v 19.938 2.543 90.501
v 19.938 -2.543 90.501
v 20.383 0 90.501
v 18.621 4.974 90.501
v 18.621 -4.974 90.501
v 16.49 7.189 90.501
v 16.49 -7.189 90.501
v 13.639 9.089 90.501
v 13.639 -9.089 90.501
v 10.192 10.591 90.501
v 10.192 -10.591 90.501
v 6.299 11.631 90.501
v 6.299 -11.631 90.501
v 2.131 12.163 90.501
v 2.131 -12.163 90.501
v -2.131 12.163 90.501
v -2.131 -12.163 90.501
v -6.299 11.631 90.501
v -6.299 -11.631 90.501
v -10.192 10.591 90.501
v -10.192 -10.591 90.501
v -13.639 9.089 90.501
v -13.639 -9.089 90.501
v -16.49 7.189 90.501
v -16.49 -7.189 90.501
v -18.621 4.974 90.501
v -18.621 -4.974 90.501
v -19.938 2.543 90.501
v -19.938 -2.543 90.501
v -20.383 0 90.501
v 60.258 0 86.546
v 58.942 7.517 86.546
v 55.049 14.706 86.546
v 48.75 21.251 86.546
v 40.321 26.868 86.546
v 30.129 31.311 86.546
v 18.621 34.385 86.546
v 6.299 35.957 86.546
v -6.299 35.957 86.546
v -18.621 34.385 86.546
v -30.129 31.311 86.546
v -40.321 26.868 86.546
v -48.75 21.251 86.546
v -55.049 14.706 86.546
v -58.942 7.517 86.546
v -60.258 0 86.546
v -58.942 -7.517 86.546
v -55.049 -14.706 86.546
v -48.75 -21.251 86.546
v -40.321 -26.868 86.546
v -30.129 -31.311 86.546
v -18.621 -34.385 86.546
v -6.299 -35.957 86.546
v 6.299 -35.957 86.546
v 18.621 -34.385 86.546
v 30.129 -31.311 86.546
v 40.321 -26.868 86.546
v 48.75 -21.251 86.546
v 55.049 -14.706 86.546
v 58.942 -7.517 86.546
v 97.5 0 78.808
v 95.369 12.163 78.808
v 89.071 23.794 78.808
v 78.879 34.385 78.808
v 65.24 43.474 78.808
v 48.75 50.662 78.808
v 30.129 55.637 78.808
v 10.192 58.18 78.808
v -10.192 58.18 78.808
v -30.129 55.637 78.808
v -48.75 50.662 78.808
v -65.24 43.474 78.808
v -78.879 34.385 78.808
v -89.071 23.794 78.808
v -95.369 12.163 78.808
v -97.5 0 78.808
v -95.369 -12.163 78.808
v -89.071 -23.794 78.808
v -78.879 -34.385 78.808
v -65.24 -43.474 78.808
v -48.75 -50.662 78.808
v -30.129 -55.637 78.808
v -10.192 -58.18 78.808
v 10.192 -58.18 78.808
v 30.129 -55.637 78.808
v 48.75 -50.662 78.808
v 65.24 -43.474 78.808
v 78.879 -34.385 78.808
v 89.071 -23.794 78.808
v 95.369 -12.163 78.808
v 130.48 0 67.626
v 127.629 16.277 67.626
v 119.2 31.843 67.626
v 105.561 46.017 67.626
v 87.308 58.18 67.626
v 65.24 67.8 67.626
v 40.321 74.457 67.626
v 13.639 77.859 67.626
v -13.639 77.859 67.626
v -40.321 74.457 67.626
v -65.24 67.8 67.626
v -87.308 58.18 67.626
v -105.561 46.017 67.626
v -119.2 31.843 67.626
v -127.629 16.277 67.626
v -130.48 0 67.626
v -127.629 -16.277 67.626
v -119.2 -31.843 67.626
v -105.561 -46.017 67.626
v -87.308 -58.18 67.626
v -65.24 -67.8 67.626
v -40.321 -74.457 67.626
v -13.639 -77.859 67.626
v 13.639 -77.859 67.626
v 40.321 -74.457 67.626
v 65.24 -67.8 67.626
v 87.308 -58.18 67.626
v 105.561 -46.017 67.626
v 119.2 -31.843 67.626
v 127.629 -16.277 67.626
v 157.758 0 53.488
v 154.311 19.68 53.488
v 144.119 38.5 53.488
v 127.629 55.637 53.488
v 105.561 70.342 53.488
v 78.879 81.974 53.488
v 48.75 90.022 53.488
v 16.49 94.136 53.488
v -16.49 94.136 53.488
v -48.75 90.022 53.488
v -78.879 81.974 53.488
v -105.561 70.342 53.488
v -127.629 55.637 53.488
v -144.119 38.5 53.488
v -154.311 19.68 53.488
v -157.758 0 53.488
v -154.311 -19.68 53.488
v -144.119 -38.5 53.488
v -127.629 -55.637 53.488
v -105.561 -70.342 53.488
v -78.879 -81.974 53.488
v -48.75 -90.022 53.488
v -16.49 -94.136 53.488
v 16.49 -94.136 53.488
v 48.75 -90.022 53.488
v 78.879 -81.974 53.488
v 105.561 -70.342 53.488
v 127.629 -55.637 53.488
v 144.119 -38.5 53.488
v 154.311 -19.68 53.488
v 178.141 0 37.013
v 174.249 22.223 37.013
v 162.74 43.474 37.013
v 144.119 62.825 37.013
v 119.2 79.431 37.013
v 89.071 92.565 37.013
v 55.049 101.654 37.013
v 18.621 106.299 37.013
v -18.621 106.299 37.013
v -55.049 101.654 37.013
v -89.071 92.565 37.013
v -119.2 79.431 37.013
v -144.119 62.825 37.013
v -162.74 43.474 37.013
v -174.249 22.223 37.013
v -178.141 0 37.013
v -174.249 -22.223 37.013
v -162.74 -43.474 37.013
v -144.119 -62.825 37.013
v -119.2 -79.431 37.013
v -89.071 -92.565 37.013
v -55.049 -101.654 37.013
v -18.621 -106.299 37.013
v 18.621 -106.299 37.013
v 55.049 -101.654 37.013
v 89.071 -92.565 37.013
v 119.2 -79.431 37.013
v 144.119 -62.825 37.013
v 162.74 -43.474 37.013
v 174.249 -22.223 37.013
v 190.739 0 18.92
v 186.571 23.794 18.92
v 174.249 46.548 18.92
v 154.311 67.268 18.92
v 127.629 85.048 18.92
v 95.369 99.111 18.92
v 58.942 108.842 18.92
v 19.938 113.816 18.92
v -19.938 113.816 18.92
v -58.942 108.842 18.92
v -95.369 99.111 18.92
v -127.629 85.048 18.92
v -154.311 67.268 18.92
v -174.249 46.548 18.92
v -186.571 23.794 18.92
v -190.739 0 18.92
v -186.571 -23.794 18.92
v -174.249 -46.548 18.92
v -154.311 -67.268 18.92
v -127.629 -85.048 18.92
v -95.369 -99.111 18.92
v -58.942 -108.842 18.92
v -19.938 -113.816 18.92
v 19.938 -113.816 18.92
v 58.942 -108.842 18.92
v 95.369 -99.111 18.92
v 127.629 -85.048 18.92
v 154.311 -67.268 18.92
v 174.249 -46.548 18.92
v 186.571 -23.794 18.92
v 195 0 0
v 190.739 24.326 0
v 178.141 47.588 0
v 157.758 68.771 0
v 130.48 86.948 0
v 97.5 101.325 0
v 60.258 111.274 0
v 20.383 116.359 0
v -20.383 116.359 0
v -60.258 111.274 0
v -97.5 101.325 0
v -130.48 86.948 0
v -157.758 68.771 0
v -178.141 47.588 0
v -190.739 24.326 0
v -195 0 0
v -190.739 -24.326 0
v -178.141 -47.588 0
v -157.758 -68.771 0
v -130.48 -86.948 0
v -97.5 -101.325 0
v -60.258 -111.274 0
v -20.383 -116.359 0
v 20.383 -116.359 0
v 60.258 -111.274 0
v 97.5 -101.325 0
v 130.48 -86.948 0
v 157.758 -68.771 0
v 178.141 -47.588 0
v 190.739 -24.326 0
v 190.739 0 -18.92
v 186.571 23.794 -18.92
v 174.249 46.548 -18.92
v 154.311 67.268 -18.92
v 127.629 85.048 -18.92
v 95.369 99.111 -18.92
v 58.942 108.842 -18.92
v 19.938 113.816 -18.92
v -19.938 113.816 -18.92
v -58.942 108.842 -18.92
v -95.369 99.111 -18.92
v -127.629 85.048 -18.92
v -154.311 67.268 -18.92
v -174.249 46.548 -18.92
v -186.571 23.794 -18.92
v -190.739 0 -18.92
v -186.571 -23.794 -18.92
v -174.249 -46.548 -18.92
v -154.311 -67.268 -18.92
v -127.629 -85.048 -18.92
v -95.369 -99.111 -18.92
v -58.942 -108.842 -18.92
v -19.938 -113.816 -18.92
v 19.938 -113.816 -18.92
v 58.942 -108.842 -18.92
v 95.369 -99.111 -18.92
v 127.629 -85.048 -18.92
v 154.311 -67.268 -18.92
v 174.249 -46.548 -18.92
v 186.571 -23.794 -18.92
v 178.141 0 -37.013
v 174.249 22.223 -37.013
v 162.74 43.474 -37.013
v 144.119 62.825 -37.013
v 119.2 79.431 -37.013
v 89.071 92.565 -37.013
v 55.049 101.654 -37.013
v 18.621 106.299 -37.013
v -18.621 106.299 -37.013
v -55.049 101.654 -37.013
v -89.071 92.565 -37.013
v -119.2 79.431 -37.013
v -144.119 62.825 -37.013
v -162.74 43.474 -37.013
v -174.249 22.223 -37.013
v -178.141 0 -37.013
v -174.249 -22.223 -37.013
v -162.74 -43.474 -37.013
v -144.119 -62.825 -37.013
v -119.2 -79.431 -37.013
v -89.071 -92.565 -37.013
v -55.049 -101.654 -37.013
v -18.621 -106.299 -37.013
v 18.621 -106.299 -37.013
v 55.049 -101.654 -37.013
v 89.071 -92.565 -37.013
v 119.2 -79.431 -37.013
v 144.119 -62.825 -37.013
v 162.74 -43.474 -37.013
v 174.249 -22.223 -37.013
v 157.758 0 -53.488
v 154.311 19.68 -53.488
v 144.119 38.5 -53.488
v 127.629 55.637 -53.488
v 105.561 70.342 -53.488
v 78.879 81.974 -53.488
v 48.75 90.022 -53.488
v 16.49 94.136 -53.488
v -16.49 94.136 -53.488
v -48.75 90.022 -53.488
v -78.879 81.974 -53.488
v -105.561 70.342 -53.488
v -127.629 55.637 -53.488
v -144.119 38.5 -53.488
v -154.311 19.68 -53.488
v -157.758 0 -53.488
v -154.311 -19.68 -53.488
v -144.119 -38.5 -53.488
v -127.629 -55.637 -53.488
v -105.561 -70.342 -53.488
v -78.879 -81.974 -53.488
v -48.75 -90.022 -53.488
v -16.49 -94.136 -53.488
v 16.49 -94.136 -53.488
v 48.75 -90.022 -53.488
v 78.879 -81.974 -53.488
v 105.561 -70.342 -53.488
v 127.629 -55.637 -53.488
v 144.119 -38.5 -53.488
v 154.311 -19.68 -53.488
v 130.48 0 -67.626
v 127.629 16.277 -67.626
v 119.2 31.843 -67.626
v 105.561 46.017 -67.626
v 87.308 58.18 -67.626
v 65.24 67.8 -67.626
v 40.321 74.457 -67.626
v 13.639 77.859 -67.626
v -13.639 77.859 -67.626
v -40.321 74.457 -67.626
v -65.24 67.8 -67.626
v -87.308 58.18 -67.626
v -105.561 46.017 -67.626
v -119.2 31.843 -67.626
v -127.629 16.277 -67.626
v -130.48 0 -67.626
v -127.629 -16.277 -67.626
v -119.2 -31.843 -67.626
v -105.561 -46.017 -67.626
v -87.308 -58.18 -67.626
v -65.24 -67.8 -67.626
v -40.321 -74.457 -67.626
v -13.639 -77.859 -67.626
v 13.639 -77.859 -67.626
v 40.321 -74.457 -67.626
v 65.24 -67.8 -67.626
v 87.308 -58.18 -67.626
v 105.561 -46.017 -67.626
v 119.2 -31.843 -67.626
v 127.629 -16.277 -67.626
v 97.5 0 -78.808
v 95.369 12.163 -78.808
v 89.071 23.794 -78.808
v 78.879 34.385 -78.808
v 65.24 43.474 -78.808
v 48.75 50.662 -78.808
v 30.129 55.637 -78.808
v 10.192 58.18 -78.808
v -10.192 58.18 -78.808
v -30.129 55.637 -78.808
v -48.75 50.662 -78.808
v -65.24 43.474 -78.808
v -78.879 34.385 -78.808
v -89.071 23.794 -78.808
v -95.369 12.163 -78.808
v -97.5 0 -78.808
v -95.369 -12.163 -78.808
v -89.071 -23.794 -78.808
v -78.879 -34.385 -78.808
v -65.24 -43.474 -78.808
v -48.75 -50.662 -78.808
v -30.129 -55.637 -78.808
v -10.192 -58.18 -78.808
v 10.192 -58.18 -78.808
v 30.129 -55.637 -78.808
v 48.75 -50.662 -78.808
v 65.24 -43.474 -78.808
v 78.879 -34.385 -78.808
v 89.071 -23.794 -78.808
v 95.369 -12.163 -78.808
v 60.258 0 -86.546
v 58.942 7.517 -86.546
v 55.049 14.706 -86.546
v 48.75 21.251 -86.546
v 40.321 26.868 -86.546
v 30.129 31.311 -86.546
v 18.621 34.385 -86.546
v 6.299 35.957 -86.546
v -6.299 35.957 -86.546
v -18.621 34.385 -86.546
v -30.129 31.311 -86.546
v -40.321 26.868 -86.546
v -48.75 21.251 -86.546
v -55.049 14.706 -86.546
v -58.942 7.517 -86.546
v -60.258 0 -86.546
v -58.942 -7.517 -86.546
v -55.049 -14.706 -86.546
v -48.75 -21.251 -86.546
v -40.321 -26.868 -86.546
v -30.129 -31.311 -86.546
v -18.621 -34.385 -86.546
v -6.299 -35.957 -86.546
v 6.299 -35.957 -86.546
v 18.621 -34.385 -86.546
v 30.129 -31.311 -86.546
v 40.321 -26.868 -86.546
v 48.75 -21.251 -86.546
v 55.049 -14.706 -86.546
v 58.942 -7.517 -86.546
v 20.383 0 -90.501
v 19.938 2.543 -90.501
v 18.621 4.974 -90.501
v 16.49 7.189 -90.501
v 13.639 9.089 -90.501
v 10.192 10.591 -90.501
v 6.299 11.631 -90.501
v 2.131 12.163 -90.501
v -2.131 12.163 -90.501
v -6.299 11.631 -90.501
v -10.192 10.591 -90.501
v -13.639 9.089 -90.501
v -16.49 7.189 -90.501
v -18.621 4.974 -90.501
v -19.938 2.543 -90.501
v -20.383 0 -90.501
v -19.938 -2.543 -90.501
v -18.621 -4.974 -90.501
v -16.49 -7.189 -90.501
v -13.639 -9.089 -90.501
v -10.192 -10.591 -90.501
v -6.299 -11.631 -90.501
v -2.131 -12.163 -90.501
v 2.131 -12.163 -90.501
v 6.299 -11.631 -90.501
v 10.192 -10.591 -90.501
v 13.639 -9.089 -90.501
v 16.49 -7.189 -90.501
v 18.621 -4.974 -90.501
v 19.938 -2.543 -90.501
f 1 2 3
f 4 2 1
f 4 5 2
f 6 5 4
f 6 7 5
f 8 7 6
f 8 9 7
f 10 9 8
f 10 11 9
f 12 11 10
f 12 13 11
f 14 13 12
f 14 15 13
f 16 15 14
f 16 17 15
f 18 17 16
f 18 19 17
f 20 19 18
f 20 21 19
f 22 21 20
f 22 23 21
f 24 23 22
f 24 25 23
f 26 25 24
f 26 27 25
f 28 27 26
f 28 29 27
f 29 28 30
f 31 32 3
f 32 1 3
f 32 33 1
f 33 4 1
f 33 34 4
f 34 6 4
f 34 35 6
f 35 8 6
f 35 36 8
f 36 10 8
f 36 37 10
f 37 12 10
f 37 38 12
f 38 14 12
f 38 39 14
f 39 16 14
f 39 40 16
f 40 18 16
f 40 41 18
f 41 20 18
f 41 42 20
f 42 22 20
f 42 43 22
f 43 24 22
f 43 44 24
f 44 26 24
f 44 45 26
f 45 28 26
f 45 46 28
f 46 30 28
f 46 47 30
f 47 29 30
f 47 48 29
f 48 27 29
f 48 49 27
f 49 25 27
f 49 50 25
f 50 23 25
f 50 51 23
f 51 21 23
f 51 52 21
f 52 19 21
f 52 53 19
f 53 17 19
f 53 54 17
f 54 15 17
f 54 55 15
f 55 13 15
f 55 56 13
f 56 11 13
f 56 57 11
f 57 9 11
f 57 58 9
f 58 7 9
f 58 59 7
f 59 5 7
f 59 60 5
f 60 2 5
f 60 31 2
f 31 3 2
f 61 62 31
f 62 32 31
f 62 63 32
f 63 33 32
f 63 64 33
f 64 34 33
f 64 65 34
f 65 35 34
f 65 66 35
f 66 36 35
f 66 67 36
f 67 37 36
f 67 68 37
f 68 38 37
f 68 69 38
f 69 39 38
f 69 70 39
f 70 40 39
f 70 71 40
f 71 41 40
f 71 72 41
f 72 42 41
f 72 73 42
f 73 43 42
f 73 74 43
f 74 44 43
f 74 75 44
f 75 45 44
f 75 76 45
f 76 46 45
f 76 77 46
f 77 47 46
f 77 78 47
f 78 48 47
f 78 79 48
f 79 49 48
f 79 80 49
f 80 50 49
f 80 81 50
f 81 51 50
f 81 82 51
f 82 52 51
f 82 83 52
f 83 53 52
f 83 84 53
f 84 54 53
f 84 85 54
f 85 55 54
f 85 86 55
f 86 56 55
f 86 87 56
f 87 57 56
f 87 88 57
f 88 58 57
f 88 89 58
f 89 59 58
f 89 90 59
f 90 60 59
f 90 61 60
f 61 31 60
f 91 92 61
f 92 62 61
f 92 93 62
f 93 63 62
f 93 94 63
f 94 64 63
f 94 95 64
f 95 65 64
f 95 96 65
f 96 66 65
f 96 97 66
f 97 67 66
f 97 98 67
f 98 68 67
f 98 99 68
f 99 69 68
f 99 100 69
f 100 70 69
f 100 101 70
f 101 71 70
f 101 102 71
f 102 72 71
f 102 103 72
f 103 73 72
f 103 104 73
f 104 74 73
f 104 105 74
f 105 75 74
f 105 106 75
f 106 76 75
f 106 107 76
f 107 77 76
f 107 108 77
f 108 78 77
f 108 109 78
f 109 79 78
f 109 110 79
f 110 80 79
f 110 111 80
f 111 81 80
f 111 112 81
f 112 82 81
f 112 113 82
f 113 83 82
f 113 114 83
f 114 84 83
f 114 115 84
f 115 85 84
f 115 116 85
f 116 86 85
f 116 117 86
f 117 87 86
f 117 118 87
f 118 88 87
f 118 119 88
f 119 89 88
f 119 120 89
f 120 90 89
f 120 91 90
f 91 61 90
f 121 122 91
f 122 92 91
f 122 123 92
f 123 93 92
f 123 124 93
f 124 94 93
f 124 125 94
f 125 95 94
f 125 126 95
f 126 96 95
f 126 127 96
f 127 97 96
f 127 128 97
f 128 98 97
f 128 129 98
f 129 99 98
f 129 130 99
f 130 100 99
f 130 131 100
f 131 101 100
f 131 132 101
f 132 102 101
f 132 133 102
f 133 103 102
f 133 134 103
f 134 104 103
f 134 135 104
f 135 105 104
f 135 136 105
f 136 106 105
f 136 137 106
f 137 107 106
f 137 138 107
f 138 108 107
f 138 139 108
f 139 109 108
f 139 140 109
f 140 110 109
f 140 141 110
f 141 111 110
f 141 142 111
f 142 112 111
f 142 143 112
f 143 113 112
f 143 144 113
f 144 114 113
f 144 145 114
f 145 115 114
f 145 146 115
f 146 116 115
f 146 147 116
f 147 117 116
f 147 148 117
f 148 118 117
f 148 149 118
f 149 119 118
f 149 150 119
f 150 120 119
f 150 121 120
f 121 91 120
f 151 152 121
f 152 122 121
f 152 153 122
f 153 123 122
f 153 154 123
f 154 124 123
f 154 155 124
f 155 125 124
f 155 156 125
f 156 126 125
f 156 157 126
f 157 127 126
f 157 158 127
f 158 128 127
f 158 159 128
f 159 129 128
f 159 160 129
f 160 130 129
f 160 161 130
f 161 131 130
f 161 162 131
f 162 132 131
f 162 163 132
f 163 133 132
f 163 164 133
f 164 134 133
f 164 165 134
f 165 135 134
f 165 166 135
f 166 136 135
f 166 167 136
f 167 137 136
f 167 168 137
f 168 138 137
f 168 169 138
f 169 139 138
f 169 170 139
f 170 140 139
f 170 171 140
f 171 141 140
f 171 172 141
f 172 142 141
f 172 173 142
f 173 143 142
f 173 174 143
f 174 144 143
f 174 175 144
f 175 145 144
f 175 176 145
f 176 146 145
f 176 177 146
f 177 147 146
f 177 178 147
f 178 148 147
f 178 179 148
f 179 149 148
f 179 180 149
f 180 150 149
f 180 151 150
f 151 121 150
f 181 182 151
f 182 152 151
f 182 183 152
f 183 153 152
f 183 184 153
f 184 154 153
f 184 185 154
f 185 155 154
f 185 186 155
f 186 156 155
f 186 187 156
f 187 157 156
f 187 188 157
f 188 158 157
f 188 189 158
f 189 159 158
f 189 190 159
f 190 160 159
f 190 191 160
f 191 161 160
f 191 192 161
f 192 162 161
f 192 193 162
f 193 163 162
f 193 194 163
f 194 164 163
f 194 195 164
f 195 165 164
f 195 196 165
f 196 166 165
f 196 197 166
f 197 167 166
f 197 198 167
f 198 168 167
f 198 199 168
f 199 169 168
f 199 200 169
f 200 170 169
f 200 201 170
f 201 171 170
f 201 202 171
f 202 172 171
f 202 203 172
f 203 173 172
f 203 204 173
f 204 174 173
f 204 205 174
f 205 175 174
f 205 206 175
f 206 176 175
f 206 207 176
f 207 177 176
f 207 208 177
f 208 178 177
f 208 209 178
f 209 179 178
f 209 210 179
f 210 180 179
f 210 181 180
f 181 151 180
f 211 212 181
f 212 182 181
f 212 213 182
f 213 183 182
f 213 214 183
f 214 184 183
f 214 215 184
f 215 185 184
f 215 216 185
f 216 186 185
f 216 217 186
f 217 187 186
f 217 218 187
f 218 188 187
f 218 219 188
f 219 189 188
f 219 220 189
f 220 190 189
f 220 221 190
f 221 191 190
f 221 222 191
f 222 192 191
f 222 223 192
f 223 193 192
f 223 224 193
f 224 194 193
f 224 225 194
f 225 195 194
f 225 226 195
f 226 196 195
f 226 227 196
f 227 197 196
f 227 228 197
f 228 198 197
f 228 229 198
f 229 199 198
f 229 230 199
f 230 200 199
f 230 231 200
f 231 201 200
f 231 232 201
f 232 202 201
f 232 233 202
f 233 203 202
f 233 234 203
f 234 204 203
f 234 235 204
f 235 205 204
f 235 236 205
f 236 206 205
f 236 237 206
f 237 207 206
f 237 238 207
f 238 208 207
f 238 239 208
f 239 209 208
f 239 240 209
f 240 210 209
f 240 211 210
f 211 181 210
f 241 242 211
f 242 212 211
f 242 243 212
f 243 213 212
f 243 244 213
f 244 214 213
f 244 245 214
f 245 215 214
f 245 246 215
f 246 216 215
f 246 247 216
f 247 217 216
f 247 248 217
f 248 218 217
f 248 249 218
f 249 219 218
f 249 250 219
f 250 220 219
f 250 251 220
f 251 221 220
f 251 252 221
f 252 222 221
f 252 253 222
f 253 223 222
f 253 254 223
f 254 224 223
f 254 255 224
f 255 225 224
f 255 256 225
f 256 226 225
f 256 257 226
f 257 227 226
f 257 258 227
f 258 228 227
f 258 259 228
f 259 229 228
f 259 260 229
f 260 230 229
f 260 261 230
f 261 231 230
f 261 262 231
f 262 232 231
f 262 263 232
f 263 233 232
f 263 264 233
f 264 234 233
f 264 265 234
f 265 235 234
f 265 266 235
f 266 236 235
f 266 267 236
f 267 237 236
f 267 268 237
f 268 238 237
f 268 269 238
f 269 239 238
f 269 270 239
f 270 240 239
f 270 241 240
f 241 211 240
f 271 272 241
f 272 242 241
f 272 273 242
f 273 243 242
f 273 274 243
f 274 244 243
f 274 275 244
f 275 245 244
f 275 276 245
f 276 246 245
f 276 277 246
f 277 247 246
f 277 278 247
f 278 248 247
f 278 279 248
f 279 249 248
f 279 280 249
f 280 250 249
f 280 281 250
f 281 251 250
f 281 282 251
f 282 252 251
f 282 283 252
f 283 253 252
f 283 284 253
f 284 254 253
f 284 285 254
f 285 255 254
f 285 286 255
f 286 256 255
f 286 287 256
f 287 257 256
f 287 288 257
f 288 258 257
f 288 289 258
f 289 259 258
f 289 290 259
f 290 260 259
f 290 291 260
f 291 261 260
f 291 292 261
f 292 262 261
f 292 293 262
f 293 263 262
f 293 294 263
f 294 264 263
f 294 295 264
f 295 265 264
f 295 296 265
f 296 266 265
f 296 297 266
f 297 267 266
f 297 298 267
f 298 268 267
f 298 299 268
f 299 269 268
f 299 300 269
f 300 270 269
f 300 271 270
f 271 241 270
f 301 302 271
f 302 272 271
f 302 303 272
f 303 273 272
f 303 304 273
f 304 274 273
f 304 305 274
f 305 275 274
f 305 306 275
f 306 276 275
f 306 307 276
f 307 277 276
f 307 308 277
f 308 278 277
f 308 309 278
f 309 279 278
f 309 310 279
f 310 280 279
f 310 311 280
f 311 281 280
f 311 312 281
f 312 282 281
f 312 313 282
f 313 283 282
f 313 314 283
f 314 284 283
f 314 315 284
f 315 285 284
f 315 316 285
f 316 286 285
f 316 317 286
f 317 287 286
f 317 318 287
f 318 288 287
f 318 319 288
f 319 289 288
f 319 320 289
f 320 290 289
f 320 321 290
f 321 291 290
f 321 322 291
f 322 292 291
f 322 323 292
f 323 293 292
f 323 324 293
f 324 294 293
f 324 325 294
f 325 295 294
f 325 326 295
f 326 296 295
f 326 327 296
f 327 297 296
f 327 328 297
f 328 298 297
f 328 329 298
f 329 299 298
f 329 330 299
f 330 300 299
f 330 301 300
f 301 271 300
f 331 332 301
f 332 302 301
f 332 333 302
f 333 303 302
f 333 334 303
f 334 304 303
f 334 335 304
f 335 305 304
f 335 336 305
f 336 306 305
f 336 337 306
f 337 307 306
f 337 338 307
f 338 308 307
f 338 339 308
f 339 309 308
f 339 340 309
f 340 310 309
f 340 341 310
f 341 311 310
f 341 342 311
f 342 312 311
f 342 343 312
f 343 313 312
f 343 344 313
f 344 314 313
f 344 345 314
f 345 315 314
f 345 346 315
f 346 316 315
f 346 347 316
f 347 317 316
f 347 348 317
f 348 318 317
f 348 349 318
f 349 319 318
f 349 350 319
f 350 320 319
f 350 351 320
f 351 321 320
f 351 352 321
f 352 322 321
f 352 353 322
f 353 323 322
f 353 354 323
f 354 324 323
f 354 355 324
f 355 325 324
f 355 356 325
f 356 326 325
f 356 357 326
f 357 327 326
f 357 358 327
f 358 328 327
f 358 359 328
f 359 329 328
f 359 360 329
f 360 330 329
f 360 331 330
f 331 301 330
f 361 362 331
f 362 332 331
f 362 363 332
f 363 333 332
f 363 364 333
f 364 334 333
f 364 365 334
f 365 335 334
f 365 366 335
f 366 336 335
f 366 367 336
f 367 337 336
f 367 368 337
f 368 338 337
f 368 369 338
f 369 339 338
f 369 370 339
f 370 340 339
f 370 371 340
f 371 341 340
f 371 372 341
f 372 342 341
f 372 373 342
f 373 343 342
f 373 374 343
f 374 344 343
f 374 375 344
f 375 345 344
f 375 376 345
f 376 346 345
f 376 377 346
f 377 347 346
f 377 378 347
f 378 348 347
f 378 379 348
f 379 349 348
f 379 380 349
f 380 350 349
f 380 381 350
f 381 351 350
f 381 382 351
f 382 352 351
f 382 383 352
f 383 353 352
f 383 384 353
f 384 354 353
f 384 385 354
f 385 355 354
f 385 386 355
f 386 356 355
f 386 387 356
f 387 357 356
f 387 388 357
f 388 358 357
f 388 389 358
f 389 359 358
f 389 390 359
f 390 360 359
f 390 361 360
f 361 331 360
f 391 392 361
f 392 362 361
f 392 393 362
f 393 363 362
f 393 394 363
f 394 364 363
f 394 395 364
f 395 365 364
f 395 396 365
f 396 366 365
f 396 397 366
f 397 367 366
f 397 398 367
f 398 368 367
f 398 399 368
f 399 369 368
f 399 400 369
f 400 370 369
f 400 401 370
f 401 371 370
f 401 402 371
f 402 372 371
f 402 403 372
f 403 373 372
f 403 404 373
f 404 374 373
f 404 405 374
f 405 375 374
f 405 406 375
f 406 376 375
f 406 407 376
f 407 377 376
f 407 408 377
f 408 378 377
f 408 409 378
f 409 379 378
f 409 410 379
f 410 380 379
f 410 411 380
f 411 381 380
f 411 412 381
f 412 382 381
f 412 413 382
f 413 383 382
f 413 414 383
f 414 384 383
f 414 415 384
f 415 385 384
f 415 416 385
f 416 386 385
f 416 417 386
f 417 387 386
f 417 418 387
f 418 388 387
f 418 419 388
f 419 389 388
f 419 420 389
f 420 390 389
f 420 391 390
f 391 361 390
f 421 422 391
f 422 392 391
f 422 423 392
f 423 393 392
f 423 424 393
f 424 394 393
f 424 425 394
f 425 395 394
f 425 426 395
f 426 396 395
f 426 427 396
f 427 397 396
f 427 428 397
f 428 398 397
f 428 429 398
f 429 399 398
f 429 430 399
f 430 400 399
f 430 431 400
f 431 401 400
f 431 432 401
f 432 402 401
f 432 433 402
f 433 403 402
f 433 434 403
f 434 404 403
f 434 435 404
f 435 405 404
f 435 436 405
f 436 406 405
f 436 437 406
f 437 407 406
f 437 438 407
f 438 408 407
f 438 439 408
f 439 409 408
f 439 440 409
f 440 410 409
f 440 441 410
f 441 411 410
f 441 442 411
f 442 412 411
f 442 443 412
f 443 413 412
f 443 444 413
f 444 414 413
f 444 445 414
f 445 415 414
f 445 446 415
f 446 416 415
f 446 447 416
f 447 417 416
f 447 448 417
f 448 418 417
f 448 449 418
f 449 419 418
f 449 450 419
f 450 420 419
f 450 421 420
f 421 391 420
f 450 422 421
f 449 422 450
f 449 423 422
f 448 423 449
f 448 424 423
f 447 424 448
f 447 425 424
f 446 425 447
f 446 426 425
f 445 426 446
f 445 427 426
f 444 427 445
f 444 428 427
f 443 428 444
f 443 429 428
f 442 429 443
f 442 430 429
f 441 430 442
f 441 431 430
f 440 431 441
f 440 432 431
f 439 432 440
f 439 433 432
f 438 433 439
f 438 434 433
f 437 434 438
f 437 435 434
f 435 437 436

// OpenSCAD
// Generated by SolidPython 1.0.1 on 2020-07-29 00:46:52


scale(v = [15, 9, 7]) {
	sphere(r = 13);
}
/***********************************************
*********      SolidPython code:      **********
************************************************
 
# import packages: SolidPython
from solid import *
from solid.utils import *
from itertools import chain, combinations, permutations


class Resize:

    def __init__(self, scad_file):
        self.scad_file = scad_file
        #self.scad_file = import_scad(scad_file)
        # cone/cylinder param:
        self.r1 = 0
        self.r2 = 0
        self.h = 0
        # rectangular prism param:
        self.w = 0
        self.l = 0
        # ellipse param:
        self.r = 0

    # import OpenScad code (file name corresponds to shape)


    # classify shape + parameters
    def assign(self, param1, param2, param3):
        if self.scad_file == 'cone.scad':
            self.r1 = param1
            self.r2 = param2
            self.h = param3
        elif self.scad_file == 'cylinder.scad':
            self.r1 = param1
            self.r2 = param2
            self.h = param3
        elif self.scad_file == 'rectangularPrism.scad':
            self.h = param1
            self.l = param2
            self.w = param3
        else:
            self.r = param1
            self.h = param2

    # resize parameters
    def iterate(self):
        x = range(3, 20, 2)
        i = 1
        if self.scad_file == 'cone.scad':
            tempList = list(permutations(x, 2))
            for temp in tempList:
                param1 = temp[0]
                param2 = temp[1]
                filepath = 'produced_scad_files/' + 'cone' + str(param1) + '_' + str(param2) + '_' + '.scad'
                scad_render_to_file(cylinder(h=param1, r1=param2, r2=0), filepath)

        elif self.scad_file == 'cylinder.scad':
            tempList = list(permutations(x, 3))
            for temp in tempList:
                param1 = temp[0]
                param2 = temp[1]
                filepath = 'produced_scad_files/' + 'cylinder' + str(param1) + '_' + str(param2) + '_' + '.scad'
                scad_render_to_file(cylinder(h=param1, r1=param2, r2=param2), filepath)

        elif self.scad_file == 'rectangularPrism.scad':
            tempList = list(permutations(x, 3))
            for temp in tempList:
                param1 = temp[0]
                param2 = temp[1]
                param3 = temp[2]
                filepath = 'produced_scad_files/' + 'rectangularPrism' + str(param1) + '_' + str(param2) + '_' + str(
                    param3) + '.scad'
                scad_render_to_file(cube(size=(param1, param2, param3)), filepath)

        elif self.scad_file == 'ellipse.scad':
            tempList = list(permutations(x, 4))
            for temp in tempList:
                param1 = temp[0]
                param2 = temp[1]
                param3 = temp[2]
                param4 = temp[3]
                filepath = 'produced_scad_files/' + 'ellipse' + str(param1) + '_' + str(param2) + '_' + str(param3) + '_' + str(param4) + '.scad'
                scad_render_to_file(scale([param1, param2, param3])(sphere(r=param4)), filepath)

    def render_to_scadfile(self):
        scad_render_to_file(scad, 'example.scad') 
 
************************************************/
